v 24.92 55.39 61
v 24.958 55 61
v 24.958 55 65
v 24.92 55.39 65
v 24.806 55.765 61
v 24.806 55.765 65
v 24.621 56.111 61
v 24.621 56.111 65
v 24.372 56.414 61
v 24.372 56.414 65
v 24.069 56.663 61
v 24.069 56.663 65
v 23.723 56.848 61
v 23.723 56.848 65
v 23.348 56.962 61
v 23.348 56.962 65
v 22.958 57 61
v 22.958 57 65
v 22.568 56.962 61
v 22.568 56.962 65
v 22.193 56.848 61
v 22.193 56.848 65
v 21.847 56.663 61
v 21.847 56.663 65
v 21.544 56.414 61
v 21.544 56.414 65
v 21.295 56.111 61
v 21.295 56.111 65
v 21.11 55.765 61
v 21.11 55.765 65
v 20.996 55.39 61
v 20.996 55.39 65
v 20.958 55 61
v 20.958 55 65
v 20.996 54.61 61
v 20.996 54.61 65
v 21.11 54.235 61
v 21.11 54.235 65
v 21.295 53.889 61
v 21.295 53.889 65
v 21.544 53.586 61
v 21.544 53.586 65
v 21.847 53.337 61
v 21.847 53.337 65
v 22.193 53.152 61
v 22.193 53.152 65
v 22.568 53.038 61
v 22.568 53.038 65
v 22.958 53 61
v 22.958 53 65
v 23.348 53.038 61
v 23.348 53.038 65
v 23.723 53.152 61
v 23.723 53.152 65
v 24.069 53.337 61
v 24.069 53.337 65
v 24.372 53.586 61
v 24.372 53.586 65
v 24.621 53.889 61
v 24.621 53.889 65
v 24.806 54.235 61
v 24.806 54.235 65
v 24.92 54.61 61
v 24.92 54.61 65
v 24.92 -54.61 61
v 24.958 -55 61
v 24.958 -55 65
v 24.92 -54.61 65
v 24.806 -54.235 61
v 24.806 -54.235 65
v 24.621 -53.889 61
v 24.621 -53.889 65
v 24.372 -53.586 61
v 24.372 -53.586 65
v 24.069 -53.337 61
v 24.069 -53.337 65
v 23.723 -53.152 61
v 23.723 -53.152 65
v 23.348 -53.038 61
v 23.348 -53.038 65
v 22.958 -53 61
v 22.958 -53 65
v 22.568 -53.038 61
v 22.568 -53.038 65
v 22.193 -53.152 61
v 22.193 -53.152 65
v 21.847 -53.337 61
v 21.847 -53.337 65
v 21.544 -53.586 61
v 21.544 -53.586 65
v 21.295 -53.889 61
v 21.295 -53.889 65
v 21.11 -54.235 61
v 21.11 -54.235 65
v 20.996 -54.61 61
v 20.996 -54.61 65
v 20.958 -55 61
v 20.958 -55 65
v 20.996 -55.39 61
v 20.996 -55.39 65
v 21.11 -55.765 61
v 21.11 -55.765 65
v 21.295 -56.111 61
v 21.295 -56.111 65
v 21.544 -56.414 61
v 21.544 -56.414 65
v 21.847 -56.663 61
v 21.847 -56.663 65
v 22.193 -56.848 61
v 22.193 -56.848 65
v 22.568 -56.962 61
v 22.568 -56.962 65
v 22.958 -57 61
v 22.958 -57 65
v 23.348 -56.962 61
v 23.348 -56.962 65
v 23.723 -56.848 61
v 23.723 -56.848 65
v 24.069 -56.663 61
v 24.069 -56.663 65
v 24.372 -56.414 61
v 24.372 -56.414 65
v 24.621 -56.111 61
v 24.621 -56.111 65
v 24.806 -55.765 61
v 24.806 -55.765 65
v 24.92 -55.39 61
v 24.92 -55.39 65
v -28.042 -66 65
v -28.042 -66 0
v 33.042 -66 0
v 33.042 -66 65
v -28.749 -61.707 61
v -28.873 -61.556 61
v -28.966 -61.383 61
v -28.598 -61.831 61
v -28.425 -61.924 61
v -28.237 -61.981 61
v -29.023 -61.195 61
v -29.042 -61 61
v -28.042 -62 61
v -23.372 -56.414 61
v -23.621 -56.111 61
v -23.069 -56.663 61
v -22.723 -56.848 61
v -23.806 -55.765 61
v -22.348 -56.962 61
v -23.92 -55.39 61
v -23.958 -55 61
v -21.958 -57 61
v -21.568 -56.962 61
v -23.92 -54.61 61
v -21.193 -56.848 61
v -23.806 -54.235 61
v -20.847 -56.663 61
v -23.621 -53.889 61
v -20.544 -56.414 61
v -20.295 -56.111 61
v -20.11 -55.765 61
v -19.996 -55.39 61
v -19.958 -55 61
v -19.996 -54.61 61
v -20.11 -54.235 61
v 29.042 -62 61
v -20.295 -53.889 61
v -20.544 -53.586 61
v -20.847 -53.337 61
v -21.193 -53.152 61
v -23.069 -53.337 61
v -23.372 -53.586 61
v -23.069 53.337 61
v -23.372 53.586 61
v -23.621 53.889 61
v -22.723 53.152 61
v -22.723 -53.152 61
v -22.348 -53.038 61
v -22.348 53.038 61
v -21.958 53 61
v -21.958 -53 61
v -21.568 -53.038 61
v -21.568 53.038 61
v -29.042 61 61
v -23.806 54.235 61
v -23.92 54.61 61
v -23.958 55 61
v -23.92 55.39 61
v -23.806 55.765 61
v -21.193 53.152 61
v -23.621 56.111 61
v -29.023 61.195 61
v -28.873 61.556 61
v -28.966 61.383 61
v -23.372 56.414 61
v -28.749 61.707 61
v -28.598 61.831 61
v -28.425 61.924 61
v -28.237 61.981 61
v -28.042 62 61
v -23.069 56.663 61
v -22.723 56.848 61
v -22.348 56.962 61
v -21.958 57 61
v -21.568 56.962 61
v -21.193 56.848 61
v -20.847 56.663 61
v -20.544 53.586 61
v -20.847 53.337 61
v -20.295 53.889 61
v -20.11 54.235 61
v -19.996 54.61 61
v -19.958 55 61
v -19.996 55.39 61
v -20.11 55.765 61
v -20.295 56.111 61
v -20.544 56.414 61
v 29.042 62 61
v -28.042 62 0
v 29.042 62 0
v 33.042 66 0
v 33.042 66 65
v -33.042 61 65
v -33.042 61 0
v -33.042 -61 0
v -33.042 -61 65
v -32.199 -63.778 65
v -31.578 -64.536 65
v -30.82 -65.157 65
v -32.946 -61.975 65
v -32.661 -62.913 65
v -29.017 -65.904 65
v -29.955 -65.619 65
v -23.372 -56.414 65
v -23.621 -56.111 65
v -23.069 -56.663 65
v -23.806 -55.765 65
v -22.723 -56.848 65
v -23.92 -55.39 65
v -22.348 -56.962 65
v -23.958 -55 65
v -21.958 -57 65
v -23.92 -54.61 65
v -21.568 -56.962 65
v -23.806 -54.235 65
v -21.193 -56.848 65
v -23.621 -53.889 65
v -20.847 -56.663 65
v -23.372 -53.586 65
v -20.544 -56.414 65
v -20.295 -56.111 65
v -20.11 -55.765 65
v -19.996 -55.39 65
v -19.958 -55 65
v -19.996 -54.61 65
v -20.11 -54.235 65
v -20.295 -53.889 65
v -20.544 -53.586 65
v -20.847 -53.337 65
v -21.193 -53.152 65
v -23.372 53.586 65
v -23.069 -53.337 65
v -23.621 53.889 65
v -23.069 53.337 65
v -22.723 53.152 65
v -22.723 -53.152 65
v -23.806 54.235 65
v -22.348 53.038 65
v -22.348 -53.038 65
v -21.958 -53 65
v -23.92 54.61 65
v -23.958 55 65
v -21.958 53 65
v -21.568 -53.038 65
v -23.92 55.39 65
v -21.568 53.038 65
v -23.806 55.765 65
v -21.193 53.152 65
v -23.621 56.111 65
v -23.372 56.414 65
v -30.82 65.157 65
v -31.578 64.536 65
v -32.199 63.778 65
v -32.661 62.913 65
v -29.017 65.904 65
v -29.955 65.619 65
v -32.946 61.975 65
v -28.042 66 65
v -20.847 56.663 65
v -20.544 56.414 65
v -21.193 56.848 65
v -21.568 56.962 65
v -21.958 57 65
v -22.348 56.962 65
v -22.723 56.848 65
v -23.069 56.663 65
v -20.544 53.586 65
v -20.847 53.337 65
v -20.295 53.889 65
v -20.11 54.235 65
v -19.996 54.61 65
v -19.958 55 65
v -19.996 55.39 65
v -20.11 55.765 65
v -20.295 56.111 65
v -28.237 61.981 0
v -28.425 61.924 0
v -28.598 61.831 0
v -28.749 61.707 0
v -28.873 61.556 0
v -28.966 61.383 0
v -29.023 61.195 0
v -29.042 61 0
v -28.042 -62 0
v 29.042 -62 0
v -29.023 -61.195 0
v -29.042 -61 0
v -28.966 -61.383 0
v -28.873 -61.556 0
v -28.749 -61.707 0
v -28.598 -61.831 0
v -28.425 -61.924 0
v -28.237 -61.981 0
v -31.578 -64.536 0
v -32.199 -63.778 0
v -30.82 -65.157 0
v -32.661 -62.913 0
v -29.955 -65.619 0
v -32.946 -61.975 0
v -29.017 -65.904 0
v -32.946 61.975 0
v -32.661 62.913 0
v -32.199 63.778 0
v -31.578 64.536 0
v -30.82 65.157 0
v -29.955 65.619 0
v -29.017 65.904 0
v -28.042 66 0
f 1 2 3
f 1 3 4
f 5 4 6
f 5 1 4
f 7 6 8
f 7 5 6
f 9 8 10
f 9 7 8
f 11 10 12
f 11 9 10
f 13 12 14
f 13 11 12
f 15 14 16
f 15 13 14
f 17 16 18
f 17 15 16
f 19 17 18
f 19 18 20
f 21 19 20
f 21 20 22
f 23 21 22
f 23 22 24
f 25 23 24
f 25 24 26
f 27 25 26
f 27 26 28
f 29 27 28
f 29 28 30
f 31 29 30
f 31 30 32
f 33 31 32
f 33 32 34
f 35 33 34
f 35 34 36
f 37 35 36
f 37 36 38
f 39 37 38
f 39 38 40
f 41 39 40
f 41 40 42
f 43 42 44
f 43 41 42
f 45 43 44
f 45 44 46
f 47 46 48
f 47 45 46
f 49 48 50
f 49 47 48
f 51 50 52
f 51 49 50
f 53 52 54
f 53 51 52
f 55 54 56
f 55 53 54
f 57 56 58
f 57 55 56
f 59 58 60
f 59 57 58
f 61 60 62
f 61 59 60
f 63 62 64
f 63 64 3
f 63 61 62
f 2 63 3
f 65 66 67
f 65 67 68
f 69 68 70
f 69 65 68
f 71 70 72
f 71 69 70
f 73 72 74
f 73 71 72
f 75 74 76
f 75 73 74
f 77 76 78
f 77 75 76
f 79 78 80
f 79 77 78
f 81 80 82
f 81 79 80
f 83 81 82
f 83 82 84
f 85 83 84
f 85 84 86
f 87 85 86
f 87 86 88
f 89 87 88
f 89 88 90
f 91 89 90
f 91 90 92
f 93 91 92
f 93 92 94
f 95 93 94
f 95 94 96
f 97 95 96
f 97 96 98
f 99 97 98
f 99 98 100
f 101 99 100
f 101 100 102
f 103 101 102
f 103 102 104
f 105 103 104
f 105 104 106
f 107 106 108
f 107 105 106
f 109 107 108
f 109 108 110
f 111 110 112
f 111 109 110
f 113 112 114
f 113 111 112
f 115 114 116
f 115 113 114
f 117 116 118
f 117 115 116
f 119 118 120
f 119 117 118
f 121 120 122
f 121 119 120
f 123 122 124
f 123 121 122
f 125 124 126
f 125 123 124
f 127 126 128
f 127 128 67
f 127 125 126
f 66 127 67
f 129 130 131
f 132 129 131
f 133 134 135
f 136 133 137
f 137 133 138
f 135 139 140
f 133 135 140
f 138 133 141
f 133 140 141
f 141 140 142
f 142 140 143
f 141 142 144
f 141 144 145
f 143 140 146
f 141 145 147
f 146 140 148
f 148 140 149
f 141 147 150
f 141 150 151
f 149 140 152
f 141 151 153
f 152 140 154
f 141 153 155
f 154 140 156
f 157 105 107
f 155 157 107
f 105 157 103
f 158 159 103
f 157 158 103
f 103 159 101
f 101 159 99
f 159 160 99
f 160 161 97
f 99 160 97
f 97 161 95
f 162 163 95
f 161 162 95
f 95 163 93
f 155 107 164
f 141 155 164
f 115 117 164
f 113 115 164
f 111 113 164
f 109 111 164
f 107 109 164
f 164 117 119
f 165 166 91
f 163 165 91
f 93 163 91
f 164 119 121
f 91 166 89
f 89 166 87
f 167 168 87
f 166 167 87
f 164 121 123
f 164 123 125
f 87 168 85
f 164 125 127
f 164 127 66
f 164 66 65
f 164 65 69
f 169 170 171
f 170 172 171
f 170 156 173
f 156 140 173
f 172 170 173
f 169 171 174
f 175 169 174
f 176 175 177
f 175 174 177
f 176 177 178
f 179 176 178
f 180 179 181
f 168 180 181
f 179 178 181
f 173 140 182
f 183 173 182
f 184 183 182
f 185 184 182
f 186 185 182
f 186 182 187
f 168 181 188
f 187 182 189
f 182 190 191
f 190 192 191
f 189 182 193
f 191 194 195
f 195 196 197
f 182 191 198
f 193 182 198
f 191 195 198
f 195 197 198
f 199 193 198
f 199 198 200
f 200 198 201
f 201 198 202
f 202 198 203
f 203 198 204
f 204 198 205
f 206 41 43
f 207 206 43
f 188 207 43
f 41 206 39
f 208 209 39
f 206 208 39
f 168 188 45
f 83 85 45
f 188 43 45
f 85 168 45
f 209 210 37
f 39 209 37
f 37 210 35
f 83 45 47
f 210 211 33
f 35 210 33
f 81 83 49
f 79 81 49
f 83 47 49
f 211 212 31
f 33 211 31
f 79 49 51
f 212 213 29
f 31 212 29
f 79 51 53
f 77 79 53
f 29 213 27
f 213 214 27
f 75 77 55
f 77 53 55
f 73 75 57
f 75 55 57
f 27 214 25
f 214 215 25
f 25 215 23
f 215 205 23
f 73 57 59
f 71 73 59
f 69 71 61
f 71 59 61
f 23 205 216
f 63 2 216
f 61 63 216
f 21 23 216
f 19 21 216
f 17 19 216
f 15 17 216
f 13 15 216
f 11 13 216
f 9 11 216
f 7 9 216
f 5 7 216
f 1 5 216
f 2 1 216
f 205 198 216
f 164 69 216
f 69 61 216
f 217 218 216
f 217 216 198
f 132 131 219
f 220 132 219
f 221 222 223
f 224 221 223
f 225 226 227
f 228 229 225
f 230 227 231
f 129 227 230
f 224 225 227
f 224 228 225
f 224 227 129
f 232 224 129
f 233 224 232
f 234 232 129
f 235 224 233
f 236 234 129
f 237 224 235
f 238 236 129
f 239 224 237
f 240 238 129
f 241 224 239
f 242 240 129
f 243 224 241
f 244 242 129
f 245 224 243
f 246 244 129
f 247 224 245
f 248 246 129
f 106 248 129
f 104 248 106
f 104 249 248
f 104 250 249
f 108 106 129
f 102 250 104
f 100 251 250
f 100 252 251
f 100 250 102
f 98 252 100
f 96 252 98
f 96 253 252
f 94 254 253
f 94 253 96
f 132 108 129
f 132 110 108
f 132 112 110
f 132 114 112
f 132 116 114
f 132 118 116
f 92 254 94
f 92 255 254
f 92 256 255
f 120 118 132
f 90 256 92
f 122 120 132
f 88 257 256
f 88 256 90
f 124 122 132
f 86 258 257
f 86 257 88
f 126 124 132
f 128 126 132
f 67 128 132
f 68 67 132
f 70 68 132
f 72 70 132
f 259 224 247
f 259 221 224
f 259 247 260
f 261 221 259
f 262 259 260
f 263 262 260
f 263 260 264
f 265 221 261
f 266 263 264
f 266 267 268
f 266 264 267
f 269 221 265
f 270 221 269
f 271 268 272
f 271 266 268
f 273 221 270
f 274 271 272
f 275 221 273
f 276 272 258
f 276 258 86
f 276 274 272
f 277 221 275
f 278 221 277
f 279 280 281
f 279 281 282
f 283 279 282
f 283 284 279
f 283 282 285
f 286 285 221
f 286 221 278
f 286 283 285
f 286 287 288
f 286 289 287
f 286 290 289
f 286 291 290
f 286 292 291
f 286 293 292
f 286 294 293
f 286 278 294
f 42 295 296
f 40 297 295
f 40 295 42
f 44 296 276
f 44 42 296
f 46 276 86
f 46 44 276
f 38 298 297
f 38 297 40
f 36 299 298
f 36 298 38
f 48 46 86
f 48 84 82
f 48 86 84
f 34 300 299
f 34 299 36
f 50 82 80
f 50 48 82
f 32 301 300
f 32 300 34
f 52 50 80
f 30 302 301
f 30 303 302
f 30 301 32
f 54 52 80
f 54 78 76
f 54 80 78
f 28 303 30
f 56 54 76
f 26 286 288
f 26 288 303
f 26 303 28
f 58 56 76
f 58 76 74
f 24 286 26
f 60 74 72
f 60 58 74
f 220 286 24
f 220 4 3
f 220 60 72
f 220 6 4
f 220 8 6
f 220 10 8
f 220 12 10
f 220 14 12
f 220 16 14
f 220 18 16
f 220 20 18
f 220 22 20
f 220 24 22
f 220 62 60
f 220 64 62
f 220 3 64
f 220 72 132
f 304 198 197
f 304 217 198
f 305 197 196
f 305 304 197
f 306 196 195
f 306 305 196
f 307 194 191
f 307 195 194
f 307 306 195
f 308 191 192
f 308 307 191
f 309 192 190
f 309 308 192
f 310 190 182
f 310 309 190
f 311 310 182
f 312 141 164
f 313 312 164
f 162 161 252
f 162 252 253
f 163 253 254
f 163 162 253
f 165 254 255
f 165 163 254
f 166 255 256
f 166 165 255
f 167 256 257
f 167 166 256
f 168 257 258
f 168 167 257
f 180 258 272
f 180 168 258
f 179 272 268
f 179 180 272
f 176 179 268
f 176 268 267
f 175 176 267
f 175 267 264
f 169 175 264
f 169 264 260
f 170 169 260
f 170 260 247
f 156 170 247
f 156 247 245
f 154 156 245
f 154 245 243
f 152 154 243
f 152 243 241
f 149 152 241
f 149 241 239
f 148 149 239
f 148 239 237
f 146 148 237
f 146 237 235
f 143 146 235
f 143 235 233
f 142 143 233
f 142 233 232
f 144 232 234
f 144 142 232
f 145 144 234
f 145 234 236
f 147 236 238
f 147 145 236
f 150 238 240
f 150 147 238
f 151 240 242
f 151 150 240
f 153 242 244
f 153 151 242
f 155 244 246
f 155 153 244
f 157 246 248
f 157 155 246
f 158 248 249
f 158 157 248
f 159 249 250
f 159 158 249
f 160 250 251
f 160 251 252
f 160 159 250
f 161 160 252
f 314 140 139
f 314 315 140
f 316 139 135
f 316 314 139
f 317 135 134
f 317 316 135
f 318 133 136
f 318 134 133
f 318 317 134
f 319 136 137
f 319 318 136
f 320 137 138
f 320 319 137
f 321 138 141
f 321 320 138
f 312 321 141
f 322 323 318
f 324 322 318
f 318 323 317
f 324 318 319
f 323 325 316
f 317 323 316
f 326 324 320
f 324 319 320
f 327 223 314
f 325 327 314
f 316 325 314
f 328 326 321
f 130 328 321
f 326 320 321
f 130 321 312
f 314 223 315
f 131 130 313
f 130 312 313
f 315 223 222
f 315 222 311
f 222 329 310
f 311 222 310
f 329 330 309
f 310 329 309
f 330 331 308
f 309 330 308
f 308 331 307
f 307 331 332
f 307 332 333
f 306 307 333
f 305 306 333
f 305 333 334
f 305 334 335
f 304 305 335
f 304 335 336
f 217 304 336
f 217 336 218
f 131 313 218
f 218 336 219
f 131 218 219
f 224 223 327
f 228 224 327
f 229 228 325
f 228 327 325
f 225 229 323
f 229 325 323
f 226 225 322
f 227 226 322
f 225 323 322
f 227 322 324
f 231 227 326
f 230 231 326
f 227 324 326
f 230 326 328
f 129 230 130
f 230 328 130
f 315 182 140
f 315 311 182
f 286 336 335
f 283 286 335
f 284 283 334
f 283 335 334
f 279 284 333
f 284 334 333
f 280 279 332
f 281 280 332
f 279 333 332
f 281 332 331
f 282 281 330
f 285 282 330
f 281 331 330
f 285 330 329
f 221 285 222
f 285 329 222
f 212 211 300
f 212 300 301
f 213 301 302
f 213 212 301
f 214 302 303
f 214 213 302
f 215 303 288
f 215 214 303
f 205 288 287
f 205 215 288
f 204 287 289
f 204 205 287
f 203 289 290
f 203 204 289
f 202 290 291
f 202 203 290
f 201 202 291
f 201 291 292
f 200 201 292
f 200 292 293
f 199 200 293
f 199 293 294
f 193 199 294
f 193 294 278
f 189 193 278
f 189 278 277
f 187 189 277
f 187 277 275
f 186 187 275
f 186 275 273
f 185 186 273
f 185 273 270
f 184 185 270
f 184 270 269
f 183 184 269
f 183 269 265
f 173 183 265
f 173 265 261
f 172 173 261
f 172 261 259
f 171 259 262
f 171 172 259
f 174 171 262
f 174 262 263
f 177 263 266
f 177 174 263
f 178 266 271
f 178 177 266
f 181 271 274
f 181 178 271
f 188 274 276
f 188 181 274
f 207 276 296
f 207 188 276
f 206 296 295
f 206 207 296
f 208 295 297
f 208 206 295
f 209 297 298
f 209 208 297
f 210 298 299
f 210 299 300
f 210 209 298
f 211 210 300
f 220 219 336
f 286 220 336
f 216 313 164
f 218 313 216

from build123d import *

# Parameters (mm, degrees)
SKETCH1_R           = 2
BOSS_EXTRUDE1_DEPTH = 65
SHELL1_T            = -4
SKETCH2_R           = 6
CUT_EXTRUDE1_DEPTH  = 61


with BuildPart() as part:
    # Sketch1 → Boss-Extrude1 (new body)
    with BuildSketch(Plane.XY):
        with BuildLine():
            Line((-33.042, 61), (-33.042, -61))
            ThreePointArc((-33.042, -61), (-31.577533906, -64.535533906), (-28.042, -66))
            Line((-28.042, -66), (33.042, -66))
            Line((33.042, -66), (33.042, 66))
            Line((33.042, 66), (-28.042, 66))
            ThreePointArc((-28.042, 66), (-31.577533906, 64.535533906), (-33.042, 61))
        make_face()
        with Locations((22.958, -55)):
            Circle(SKETCH1_R, mode=Mode.SUBTRACT)
        with Locations((-21.958, 55)):
            Circle(SKETCH1_R, mode=Mode.SUBTRACT)
        with Locations((-21.958, -55)):
            Circle(SKETCH1_R, mode=Mode.SUBTRACT)
        with Locations((22.958, 55)):
            Circle(SKETCH1_R, mode=Mode.SUBTRACT)
    extrude(amount=BOSS_EXTRUDE1_DEPTH)

    # Shell1
    shell1_openings = [part.faces().sort_by_distance(p)[0] for p in [
        (-9.692511302, 0, 0),
    ]]
    offset(amount=SHELL1_T, openings=shell1_openings, kind=Kind.INTERSECTION)

    # Sketch2 → Cut-Extrude1 (cut)
    with BuildSketch(Plane(origin=(0, 0, 0), x_dir=(-1, 0, 0), z_dir=(0, 0, -1))):
        with Locations((-22.958, -55)):
            Circle(SKETCH2_R)
        with Locations((21.958, -55)):
            Circle(SKETCH2_R)
        with Locations((21.958, 55)):
            Circle(SKETCH2_R)
        with Locations((-22.958, 55)):
            Circle(SKETCH2_R)
    extrude(amount=-CUT_EXTRUDE1_DEPTH, mode=Mode.SUBTRACT)


solid = part.part
